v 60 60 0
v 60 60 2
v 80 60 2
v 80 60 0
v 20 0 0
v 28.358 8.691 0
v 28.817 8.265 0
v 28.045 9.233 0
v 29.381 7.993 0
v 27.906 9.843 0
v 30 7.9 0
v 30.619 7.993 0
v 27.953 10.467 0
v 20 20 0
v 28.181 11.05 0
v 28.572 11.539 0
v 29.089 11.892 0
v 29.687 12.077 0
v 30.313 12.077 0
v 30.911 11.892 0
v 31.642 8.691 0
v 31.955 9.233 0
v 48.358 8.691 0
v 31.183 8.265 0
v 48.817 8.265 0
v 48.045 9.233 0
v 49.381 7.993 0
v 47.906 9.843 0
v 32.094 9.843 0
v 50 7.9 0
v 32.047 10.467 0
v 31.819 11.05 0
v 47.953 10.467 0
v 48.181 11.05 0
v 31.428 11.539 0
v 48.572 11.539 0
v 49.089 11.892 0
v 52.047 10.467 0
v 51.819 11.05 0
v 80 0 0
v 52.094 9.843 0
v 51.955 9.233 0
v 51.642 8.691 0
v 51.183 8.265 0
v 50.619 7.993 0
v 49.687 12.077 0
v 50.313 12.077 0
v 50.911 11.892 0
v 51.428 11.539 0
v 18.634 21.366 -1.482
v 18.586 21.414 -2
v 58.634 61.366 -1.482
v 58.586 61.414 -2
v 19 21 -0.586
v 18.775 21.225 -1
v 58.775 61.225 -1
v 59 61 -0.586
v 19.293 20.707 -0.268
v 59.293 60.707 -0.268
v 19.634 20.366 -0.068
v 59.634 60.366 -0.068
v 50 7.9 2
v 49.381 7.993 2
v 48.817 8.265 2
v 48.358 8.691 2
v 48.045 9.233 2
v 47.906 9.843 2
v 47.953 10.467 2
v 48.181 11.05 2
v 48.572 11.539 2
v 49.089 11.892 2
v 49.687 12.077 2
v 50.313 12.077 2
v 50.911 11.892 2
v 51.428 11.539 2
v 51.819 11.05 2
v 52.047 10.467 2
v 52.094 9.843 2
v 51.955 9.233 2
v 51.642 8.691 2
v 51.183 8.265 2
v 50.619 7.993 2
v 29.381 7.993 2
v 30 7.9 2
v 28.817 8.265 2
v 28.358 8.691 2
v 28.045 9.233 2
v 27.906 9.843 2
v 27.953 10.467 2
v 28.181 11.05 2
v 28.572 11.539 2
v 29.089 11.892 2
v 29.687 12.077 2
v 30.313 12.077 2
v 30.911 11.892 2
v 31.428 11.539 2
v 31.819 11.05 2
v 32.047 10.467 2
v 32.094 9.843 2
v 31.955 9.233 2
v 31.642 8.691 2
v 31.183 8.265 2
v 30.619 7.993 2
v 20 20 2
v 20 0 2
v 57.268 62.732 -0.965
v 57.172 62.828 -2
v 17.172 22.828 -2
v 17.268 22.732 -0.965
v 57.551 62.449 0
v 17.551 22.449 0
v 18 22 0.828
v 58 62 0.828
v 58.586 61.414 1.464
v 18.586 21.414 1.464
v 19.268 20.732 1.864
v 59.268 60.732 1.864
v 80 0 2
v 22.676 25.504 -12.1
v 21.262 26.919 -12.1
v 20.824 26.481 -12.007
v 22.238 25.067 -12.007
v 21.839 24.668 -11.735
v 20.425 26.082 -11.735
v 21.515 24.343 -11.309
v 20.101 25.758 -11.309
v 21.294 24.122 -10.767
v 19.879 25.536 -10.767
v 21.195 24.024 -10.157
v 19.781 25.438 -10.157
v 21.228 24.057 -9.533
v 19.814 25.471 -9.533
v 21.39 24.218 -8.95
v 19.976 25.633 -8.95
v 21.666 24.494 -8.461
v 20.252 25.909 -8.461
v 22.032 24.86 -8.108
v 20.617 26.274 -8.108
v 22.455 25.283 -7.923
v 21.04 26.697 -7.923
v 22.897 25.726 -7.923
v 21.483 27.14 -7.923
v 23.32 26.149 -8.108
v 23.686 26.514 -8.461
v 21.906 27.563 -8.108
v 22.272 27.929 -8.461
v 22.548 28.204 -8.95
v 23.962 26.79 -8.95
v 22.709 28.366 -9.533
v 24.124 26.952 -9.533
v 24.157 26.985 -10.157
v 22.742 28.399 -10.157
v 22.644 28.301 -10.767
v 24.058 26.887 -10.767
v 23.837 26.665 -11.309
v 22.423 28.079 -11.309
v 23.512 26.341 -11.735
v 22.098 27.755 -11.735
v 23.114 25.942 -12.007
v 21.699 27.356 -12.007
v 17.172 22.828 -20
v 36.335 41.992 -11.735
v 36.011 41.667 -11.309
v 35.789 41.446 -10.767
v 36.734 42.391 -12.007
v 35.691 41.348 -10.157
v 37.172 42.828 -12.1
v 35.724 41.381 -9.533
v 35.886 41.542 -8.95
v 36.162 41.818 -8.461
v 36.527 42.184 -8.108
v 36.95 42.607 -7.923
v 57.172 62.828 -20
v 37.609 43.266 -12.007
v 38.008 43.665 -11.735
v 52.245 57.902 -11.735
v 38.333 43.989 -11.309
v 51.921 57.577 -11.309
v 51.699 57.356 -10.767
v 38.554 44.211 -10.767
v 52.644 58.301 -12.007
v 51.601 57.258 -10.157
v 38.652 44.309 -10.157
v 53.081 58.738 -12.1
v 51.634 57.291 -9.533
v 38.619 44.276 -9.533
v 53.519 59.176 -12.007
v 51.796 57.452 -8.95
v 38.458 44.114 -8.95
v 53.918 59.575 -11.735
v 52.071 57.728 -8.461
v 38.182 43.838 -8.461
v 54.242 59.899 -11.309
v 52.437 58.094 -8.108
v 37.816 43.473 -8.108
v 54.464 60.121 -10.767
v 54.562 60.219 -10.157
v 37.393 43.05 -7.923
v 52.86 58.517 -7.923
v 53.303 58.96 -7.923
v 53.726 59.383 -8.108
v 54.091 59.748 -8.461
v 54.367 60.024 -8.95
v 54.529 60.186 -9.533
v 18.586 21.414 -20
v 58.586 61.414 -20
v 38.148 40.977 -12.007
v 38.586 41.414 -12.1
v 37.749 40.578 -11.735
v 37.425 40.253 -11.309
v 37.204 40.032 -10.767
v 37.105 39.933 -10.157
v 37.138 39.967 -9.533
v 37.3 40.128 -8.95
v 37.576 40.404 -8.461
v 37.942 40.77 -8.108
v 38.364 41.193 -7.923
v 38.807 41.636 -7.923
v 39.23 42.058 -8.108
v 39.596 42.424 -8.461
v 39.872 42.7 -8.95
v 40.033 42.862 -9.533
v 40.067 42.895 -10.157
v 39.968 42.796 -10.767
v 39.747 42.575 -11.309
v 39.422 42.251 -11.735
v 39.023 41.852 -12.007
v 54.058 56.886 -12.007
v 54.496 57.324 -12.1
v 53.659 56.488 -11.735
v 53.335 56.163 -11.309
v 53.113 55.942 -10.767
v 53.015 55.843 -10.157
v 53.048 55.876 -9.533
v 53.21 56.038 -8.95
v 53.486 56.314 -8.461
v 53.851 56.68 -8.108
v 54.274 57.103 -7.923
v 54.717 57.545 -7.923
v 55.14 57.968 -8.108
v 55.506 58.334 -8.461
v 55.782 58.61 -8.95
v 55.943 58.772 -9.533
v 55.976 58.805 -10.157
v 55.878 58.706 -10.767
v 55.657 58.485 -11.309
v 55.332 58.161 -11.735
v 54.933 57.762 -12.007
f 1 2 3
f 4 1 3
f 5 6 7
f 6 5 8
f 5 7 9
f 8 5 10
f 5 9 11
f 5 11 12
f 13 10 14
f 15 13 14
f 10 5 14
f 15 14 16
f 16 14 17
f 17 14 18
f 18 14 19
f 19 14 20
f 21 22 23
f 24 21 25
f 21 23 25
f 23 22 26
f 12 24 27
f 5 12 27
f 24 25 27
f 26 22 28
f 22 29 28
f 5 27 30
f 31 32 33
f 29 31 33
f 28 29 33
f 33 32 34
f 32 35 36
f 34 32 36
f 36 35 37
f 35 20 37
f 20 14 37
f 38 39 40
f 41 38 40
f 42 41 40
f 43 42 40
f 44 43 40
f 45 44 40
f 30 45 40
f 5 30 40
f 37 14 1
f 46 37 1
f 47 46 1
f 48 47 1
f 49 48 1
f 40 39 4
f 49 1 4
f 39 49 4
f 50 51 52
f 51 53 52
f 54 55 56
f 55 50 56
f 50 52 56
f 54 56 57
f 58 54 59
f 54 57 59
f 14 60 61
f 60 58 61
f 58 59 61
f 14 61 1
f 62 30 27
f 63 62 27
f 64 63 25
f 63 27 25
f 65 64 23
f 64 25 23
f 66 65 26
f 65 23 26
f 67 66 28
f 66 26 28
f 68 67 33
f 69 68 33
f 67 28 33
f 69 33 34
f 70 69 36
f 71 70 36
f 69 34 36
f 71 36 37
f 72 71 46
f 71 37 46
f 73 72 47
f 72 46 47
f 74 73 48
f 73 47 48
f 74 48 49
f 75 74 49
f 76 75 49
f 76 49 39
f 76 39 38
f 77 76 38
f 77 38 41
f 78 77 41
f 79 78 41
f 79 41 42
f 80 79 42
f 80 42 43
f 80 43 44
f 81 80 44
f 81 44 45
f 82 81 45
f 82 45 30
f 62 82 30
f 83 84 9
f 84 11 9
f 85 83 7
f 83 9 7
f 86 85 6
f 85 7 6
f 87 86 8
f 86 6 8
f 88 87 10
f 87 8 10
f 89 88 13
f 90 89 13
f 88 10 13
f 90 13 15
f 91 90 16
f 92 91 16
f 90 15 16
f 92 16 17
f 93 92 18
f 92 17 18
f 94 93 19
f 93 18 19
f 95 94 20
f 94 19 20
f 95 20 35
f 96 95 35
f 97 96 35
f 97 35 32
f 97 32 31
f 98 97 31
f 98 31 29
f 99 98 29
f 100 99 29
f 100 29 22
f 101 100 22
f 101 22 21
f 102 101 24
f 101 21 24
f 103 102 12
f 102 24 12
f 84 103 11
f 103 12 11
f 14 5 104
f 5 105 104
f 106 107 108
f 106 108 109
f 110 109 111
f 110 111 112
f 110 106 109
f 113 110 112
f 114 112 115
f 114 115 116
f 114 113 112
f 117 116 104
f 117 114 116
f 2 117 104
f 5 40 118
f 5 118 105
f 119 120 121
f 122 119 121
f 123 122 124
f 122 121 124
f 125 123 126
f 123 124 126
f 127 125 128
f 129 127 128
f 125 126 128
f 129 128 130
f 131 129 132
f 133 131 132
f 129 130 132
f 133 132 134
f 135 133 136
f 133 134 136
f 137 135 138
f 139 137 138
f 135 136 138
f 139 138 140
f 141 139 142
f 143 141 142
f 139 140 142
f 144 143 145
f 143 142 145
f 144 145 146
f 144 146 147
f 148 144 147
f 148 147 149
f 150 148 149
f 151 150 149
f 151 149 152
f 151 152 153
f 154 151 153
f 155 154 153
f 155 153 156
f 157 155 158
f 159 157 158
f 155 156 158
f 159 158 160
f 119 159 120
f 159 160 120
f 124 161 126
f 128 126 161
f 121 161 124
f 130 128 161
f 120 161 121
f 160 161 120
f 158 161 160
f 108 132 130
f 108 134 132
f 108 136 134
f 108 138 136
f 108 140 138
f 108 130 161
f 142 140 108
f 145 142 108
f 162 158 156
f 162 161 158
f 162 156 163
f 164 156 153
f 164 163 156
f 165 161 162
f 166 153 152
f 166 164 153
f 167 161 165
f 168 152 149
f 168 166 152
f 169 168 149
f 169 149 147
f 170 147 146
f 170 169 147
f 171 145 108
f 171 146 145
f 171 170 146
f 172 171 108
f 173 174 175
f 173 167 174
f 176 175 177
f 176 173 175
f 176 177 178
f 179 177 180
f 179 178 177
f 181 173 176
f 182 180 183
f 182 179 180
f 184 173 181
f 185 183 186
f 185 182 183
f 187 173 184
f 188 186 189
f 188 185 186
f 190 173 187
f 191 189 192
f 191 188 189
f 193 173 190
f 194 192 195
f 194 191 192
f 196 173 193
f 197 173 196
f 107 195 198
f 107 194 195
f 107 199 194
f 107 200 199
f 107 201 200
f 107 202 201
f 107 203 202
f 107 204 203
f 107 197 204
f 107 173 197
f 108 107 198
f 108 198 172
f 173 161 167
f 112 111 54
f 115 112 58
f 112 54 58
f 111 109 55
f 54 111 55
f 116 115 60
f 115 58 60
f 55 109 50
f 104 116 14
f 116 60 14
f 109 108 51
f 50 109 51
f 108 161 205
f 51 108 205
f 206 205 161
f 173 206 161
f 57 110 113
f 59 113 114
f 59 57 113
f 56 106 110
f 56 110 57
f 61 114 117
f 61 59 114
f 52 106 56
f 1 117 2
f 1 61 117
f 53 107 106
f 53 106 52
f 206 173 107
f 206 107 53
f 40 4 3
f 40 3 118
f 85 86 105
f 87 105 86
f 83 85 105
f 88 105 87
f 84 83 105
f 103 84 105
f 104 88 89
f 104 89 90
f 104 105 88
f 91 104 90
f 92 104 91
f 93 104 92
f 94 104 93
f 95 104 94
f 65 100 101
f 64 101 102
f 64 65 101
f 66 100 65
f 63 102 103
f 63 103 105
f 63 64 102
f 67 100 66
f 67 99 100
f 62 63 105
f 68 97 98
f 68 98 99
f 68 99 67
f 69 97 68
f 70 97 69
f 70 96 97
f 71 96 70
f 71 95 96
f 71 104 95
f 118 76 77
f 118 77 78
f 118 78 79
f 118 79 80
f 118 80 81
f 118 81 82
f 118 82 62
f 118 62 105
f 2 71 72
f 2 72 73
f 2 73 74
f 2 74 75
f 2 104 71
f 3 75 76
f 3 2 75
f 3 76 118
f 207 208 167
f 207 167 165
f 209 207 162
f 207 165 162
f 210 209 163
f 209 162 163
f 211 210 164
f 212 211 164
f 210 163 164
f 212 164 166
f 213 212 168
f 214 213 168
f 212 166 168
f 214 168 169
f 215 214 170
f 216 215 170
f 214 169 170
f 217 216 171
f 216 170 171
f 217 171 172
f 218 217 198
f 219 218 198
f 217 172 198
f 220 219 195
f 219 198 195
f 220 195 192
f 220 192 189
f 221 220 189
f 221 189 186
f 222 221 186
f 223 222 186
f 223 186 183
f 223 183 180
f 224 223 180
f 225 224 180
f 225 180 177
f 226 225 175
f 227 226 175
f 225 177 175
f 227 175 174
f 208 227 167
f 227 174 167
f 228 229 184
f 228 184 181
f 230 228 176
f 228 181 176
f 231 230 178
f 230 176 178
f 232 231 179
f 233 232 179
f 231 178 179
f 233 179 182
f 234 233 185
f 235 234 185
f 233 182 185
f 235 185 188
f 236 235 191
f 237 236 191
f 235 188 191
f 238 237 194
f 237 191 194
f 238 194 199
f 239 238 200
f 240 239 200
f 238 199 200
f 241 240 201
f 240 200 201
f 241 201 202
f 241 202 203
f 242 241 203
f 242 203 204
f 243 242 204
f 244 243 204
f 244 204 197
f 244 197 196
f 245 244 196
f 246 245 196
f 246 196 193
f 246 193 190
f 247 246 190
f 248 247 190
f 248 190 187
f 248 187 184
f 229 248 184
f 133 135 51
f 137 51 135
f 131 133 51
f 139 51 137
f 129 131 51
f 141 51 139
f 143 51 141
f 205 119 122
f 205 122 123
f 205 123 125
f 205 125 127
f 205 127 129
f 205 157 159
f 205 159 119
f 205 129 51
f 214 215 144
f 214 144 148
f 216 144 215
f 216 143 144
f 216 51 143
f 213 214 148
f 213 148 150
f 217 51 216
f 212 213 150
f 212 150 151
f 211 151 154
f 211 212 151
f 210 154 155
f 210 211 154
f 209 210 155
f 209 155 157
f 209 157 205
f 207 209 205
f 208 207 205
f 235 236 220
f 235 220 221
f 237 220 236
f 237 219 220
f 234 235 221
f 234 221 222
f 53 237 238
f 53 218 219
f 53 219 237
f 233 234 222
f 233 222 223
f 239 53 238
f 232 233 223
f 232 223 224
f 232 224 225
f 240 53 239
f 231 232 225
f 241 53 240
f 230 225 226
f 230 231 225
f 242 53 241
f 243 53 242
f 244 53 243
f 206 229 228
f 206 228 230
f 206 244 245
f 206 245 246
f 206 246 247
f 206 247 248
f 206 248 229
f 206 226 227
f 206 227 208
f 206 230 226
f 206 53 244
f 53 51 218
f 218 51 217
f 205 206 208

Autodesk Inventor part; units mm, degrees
ref_plane "YZ Plane" through (0, 0, 0) normal (1, 0, 0) x (0, 1, 0)
ref_plane "XZ Plane" through (0, 0, 0) normal (0, 1, 0) x (-1, 0, 0)
ref_plane "XY Plane" through (0, 0, 0) normal (0, 0, 1) x (1, 0, 0)
sketch "スケッチ1" plane through (0, 0, 0) normal (0, 0, 1) x (1, 0, 0)
  line L0 (0, 0) -> (80, 80)
  line L1 (80, 80) -> (80, 0)
  line L2 (80, 0) -> (0, 0)
  dimension "d0" = 45
  dimension "d1" = 80
extrude "プレート1" add sketch "スケッチ1" along normal blind 2
sketch "スケッチ2" plane through (0, 0, 2) normal (0, 0, 1) x (1, 0, 0)
  line L0 (0, 0) -> (80, 80) projected
  line L1 (0, 0) -> (20, 0)
  line L2 (20, 0) -> (20, 20)
  line L3 (20, 20) -> (0, 20)
  line L4 (0, 20) -> (0, 0)
  line L5 (80, 80) -> (60, 80)
  line L6 (60, 80) -> (60, 60)
  line L7 (60, 60) -> (80, 60)
  line L8 (80, 60) -> (80, 80)
  line L9 (0, 0) -> (80, 80) projected
  dimension "d3" = 20
  dimension "d6" = 20
extrude "押し出し1" cut sketch "スケッチ2" against normal blind 10 contours L0 L2 L1 | L6 L5 L0 | L0 L8 L7
sketch "スケッチ3" plane through (0, 0, 2) normal (0, 0, 1) x (1, 0, 0)
  line L0 (20, 20) -> (20, 0) projected
  line L1 (80, 0) -> (20, 0) projected
  line L2 (80, 60) -> (80, 0) projected
  line L3 (80, 60) -> (60, 60) projected
  line L4 (20, 20) -> (60, 60) projected
  line L5 (20, 20) -> (60, 60) projected
  line L6 (20, 20) -> (18.5858, 21.4142)
  line L7 (18.5858, 21.4142) -> (58.5858, 61.4142)
  line L8 (58.5858, 61.4142) -> (60, 60)
  point P0 (0, 0)
  dimension "d7" = 2
extrude "押し出し2" add sketch "スケッチ3" against normal up to surface (2 mm away) contours L6 L7 L8 L4
sketch "スケッチ4" plane through (58.5858, 61.4142, 0) normal (-0.7071068, 0.7071068, 0) x (-0.7071068, -0.7071068, 0)
  line L0 (56.5685, 0) -> (0, 0)
  line L1 (0, 0) -> (0, -20)
  line L2 (0, -20) -> (56.5685, -20)
  line L3 (56.5685, -20) -> (56.5685, 0)
edge flange "フランジ1" height 22 angle 90 thickness 2 bend radius 2 thickness toward (-0.7071068, 0.7071068, 0) relief tear relief width 2 relief depth 1 edges at (38.5858, 41.4142, 0) wall of the first edge with corners at (18.5858, 21.4142, 0) (58.5858, 61.4142, 0) (58.5858, 61.4142, -20) (18.5858, 21.4142, -20)
bend "曲げ1"
corner "コーナー1"
sketch "スケッチ5" plane through (18.5858, 21.4142, -2) normal (0.7071068, -0.7071068, 0) x (-0.7071068, -0.7071068, 0)
  line L0 (-56.5685, 0) -> (0, 0) projected
  line L1 (0, 0) -> (0, 18) projected
  line L2 (0, 18) -> (-56.5685, 18) projected
  line L3 (-56.5685, 0) -> (-56.5685, 18) projected
  line L4 (-56.5685, 0) -> (0, 0) projected
  point P0 (28.2843, -2)
  point P1 (-50.7843, 8)
  point P2 (-5.7843, 8)
  point P3 (-28.2843, 8)
  point P4 (-28.2843, 0)
  point P5 (-28.2843, 0)
  dimension "d20" = 10
  dimension "d23" = 45
  dimension "d24" = 22.5
hole "穴1" at (54.4957, 57.3241, -10) at (22.6759, 25.5043, -10) at (38.5858, 41.4142, -10) direction (-0.7071068, 0.7071068, 0) diameter 4.2 depth 2
sketch "スケッチ6" plane through (0, 0, 2) normal (0, 0, 1) x (1, 0, 0)
  line L0 (80, 0) -> (20, 0) projected
  line L1 (20, 20) -> (20, 0) projected
  line L2 (80, 60) -> (80, 0) projected
  point P0 (0, 0)
  point P1 (30, 10)
  point P2 (70, 10)
  point P3 (50, 10)
  dimension "d32" = 10
  dimension "d33" = 10
  dimension "d34" = 10
  dimension "d35" = 20
hole "穴2" at (30, 10, 2) at (50, 10, 2) direction (0, 0, -1) diameter 4.2 depth 2
equation "\"d24\" = 0.5 * d23"
equation "\"d30\" = Thickness"
equation "\"d41\" = Thickness"
equation "\"d2\" = Thickness"
equation "\"d10\" = BendReliefWidth"
equation "\"d11\" = BendReliefDepth"
equation "\"d12\" = MinimumRemnant"
equation "\"d13\" = TransitionRadius"
equation "\"d16\" = BendRadius"
equation "\"d17\" = CornerReliefSize"
equation "\"d18\" = GapSize"
equation "\"d19\" = JacobiRadiusSize"
equation "\"BendRadius\" = Thickness"
equation "\"BendReliefWidth\" = Thickness"
equation "\"BendReliefDepth\" = 0.5 * Thickness"
equation "\"CornerReliefSize\" = 4 * Thickness"
equation "\"MinimumRemnant\" = 2 * Thickness"
equation "\"TransitionRadius\" = BendRadius"
equation "\"JacobiRadiusSize\" = BendRadius"
equation "\"GapSize\" = Thickness"
equation "\"Thickness\" = 2"
properties part number "CoreXY_Angle"
